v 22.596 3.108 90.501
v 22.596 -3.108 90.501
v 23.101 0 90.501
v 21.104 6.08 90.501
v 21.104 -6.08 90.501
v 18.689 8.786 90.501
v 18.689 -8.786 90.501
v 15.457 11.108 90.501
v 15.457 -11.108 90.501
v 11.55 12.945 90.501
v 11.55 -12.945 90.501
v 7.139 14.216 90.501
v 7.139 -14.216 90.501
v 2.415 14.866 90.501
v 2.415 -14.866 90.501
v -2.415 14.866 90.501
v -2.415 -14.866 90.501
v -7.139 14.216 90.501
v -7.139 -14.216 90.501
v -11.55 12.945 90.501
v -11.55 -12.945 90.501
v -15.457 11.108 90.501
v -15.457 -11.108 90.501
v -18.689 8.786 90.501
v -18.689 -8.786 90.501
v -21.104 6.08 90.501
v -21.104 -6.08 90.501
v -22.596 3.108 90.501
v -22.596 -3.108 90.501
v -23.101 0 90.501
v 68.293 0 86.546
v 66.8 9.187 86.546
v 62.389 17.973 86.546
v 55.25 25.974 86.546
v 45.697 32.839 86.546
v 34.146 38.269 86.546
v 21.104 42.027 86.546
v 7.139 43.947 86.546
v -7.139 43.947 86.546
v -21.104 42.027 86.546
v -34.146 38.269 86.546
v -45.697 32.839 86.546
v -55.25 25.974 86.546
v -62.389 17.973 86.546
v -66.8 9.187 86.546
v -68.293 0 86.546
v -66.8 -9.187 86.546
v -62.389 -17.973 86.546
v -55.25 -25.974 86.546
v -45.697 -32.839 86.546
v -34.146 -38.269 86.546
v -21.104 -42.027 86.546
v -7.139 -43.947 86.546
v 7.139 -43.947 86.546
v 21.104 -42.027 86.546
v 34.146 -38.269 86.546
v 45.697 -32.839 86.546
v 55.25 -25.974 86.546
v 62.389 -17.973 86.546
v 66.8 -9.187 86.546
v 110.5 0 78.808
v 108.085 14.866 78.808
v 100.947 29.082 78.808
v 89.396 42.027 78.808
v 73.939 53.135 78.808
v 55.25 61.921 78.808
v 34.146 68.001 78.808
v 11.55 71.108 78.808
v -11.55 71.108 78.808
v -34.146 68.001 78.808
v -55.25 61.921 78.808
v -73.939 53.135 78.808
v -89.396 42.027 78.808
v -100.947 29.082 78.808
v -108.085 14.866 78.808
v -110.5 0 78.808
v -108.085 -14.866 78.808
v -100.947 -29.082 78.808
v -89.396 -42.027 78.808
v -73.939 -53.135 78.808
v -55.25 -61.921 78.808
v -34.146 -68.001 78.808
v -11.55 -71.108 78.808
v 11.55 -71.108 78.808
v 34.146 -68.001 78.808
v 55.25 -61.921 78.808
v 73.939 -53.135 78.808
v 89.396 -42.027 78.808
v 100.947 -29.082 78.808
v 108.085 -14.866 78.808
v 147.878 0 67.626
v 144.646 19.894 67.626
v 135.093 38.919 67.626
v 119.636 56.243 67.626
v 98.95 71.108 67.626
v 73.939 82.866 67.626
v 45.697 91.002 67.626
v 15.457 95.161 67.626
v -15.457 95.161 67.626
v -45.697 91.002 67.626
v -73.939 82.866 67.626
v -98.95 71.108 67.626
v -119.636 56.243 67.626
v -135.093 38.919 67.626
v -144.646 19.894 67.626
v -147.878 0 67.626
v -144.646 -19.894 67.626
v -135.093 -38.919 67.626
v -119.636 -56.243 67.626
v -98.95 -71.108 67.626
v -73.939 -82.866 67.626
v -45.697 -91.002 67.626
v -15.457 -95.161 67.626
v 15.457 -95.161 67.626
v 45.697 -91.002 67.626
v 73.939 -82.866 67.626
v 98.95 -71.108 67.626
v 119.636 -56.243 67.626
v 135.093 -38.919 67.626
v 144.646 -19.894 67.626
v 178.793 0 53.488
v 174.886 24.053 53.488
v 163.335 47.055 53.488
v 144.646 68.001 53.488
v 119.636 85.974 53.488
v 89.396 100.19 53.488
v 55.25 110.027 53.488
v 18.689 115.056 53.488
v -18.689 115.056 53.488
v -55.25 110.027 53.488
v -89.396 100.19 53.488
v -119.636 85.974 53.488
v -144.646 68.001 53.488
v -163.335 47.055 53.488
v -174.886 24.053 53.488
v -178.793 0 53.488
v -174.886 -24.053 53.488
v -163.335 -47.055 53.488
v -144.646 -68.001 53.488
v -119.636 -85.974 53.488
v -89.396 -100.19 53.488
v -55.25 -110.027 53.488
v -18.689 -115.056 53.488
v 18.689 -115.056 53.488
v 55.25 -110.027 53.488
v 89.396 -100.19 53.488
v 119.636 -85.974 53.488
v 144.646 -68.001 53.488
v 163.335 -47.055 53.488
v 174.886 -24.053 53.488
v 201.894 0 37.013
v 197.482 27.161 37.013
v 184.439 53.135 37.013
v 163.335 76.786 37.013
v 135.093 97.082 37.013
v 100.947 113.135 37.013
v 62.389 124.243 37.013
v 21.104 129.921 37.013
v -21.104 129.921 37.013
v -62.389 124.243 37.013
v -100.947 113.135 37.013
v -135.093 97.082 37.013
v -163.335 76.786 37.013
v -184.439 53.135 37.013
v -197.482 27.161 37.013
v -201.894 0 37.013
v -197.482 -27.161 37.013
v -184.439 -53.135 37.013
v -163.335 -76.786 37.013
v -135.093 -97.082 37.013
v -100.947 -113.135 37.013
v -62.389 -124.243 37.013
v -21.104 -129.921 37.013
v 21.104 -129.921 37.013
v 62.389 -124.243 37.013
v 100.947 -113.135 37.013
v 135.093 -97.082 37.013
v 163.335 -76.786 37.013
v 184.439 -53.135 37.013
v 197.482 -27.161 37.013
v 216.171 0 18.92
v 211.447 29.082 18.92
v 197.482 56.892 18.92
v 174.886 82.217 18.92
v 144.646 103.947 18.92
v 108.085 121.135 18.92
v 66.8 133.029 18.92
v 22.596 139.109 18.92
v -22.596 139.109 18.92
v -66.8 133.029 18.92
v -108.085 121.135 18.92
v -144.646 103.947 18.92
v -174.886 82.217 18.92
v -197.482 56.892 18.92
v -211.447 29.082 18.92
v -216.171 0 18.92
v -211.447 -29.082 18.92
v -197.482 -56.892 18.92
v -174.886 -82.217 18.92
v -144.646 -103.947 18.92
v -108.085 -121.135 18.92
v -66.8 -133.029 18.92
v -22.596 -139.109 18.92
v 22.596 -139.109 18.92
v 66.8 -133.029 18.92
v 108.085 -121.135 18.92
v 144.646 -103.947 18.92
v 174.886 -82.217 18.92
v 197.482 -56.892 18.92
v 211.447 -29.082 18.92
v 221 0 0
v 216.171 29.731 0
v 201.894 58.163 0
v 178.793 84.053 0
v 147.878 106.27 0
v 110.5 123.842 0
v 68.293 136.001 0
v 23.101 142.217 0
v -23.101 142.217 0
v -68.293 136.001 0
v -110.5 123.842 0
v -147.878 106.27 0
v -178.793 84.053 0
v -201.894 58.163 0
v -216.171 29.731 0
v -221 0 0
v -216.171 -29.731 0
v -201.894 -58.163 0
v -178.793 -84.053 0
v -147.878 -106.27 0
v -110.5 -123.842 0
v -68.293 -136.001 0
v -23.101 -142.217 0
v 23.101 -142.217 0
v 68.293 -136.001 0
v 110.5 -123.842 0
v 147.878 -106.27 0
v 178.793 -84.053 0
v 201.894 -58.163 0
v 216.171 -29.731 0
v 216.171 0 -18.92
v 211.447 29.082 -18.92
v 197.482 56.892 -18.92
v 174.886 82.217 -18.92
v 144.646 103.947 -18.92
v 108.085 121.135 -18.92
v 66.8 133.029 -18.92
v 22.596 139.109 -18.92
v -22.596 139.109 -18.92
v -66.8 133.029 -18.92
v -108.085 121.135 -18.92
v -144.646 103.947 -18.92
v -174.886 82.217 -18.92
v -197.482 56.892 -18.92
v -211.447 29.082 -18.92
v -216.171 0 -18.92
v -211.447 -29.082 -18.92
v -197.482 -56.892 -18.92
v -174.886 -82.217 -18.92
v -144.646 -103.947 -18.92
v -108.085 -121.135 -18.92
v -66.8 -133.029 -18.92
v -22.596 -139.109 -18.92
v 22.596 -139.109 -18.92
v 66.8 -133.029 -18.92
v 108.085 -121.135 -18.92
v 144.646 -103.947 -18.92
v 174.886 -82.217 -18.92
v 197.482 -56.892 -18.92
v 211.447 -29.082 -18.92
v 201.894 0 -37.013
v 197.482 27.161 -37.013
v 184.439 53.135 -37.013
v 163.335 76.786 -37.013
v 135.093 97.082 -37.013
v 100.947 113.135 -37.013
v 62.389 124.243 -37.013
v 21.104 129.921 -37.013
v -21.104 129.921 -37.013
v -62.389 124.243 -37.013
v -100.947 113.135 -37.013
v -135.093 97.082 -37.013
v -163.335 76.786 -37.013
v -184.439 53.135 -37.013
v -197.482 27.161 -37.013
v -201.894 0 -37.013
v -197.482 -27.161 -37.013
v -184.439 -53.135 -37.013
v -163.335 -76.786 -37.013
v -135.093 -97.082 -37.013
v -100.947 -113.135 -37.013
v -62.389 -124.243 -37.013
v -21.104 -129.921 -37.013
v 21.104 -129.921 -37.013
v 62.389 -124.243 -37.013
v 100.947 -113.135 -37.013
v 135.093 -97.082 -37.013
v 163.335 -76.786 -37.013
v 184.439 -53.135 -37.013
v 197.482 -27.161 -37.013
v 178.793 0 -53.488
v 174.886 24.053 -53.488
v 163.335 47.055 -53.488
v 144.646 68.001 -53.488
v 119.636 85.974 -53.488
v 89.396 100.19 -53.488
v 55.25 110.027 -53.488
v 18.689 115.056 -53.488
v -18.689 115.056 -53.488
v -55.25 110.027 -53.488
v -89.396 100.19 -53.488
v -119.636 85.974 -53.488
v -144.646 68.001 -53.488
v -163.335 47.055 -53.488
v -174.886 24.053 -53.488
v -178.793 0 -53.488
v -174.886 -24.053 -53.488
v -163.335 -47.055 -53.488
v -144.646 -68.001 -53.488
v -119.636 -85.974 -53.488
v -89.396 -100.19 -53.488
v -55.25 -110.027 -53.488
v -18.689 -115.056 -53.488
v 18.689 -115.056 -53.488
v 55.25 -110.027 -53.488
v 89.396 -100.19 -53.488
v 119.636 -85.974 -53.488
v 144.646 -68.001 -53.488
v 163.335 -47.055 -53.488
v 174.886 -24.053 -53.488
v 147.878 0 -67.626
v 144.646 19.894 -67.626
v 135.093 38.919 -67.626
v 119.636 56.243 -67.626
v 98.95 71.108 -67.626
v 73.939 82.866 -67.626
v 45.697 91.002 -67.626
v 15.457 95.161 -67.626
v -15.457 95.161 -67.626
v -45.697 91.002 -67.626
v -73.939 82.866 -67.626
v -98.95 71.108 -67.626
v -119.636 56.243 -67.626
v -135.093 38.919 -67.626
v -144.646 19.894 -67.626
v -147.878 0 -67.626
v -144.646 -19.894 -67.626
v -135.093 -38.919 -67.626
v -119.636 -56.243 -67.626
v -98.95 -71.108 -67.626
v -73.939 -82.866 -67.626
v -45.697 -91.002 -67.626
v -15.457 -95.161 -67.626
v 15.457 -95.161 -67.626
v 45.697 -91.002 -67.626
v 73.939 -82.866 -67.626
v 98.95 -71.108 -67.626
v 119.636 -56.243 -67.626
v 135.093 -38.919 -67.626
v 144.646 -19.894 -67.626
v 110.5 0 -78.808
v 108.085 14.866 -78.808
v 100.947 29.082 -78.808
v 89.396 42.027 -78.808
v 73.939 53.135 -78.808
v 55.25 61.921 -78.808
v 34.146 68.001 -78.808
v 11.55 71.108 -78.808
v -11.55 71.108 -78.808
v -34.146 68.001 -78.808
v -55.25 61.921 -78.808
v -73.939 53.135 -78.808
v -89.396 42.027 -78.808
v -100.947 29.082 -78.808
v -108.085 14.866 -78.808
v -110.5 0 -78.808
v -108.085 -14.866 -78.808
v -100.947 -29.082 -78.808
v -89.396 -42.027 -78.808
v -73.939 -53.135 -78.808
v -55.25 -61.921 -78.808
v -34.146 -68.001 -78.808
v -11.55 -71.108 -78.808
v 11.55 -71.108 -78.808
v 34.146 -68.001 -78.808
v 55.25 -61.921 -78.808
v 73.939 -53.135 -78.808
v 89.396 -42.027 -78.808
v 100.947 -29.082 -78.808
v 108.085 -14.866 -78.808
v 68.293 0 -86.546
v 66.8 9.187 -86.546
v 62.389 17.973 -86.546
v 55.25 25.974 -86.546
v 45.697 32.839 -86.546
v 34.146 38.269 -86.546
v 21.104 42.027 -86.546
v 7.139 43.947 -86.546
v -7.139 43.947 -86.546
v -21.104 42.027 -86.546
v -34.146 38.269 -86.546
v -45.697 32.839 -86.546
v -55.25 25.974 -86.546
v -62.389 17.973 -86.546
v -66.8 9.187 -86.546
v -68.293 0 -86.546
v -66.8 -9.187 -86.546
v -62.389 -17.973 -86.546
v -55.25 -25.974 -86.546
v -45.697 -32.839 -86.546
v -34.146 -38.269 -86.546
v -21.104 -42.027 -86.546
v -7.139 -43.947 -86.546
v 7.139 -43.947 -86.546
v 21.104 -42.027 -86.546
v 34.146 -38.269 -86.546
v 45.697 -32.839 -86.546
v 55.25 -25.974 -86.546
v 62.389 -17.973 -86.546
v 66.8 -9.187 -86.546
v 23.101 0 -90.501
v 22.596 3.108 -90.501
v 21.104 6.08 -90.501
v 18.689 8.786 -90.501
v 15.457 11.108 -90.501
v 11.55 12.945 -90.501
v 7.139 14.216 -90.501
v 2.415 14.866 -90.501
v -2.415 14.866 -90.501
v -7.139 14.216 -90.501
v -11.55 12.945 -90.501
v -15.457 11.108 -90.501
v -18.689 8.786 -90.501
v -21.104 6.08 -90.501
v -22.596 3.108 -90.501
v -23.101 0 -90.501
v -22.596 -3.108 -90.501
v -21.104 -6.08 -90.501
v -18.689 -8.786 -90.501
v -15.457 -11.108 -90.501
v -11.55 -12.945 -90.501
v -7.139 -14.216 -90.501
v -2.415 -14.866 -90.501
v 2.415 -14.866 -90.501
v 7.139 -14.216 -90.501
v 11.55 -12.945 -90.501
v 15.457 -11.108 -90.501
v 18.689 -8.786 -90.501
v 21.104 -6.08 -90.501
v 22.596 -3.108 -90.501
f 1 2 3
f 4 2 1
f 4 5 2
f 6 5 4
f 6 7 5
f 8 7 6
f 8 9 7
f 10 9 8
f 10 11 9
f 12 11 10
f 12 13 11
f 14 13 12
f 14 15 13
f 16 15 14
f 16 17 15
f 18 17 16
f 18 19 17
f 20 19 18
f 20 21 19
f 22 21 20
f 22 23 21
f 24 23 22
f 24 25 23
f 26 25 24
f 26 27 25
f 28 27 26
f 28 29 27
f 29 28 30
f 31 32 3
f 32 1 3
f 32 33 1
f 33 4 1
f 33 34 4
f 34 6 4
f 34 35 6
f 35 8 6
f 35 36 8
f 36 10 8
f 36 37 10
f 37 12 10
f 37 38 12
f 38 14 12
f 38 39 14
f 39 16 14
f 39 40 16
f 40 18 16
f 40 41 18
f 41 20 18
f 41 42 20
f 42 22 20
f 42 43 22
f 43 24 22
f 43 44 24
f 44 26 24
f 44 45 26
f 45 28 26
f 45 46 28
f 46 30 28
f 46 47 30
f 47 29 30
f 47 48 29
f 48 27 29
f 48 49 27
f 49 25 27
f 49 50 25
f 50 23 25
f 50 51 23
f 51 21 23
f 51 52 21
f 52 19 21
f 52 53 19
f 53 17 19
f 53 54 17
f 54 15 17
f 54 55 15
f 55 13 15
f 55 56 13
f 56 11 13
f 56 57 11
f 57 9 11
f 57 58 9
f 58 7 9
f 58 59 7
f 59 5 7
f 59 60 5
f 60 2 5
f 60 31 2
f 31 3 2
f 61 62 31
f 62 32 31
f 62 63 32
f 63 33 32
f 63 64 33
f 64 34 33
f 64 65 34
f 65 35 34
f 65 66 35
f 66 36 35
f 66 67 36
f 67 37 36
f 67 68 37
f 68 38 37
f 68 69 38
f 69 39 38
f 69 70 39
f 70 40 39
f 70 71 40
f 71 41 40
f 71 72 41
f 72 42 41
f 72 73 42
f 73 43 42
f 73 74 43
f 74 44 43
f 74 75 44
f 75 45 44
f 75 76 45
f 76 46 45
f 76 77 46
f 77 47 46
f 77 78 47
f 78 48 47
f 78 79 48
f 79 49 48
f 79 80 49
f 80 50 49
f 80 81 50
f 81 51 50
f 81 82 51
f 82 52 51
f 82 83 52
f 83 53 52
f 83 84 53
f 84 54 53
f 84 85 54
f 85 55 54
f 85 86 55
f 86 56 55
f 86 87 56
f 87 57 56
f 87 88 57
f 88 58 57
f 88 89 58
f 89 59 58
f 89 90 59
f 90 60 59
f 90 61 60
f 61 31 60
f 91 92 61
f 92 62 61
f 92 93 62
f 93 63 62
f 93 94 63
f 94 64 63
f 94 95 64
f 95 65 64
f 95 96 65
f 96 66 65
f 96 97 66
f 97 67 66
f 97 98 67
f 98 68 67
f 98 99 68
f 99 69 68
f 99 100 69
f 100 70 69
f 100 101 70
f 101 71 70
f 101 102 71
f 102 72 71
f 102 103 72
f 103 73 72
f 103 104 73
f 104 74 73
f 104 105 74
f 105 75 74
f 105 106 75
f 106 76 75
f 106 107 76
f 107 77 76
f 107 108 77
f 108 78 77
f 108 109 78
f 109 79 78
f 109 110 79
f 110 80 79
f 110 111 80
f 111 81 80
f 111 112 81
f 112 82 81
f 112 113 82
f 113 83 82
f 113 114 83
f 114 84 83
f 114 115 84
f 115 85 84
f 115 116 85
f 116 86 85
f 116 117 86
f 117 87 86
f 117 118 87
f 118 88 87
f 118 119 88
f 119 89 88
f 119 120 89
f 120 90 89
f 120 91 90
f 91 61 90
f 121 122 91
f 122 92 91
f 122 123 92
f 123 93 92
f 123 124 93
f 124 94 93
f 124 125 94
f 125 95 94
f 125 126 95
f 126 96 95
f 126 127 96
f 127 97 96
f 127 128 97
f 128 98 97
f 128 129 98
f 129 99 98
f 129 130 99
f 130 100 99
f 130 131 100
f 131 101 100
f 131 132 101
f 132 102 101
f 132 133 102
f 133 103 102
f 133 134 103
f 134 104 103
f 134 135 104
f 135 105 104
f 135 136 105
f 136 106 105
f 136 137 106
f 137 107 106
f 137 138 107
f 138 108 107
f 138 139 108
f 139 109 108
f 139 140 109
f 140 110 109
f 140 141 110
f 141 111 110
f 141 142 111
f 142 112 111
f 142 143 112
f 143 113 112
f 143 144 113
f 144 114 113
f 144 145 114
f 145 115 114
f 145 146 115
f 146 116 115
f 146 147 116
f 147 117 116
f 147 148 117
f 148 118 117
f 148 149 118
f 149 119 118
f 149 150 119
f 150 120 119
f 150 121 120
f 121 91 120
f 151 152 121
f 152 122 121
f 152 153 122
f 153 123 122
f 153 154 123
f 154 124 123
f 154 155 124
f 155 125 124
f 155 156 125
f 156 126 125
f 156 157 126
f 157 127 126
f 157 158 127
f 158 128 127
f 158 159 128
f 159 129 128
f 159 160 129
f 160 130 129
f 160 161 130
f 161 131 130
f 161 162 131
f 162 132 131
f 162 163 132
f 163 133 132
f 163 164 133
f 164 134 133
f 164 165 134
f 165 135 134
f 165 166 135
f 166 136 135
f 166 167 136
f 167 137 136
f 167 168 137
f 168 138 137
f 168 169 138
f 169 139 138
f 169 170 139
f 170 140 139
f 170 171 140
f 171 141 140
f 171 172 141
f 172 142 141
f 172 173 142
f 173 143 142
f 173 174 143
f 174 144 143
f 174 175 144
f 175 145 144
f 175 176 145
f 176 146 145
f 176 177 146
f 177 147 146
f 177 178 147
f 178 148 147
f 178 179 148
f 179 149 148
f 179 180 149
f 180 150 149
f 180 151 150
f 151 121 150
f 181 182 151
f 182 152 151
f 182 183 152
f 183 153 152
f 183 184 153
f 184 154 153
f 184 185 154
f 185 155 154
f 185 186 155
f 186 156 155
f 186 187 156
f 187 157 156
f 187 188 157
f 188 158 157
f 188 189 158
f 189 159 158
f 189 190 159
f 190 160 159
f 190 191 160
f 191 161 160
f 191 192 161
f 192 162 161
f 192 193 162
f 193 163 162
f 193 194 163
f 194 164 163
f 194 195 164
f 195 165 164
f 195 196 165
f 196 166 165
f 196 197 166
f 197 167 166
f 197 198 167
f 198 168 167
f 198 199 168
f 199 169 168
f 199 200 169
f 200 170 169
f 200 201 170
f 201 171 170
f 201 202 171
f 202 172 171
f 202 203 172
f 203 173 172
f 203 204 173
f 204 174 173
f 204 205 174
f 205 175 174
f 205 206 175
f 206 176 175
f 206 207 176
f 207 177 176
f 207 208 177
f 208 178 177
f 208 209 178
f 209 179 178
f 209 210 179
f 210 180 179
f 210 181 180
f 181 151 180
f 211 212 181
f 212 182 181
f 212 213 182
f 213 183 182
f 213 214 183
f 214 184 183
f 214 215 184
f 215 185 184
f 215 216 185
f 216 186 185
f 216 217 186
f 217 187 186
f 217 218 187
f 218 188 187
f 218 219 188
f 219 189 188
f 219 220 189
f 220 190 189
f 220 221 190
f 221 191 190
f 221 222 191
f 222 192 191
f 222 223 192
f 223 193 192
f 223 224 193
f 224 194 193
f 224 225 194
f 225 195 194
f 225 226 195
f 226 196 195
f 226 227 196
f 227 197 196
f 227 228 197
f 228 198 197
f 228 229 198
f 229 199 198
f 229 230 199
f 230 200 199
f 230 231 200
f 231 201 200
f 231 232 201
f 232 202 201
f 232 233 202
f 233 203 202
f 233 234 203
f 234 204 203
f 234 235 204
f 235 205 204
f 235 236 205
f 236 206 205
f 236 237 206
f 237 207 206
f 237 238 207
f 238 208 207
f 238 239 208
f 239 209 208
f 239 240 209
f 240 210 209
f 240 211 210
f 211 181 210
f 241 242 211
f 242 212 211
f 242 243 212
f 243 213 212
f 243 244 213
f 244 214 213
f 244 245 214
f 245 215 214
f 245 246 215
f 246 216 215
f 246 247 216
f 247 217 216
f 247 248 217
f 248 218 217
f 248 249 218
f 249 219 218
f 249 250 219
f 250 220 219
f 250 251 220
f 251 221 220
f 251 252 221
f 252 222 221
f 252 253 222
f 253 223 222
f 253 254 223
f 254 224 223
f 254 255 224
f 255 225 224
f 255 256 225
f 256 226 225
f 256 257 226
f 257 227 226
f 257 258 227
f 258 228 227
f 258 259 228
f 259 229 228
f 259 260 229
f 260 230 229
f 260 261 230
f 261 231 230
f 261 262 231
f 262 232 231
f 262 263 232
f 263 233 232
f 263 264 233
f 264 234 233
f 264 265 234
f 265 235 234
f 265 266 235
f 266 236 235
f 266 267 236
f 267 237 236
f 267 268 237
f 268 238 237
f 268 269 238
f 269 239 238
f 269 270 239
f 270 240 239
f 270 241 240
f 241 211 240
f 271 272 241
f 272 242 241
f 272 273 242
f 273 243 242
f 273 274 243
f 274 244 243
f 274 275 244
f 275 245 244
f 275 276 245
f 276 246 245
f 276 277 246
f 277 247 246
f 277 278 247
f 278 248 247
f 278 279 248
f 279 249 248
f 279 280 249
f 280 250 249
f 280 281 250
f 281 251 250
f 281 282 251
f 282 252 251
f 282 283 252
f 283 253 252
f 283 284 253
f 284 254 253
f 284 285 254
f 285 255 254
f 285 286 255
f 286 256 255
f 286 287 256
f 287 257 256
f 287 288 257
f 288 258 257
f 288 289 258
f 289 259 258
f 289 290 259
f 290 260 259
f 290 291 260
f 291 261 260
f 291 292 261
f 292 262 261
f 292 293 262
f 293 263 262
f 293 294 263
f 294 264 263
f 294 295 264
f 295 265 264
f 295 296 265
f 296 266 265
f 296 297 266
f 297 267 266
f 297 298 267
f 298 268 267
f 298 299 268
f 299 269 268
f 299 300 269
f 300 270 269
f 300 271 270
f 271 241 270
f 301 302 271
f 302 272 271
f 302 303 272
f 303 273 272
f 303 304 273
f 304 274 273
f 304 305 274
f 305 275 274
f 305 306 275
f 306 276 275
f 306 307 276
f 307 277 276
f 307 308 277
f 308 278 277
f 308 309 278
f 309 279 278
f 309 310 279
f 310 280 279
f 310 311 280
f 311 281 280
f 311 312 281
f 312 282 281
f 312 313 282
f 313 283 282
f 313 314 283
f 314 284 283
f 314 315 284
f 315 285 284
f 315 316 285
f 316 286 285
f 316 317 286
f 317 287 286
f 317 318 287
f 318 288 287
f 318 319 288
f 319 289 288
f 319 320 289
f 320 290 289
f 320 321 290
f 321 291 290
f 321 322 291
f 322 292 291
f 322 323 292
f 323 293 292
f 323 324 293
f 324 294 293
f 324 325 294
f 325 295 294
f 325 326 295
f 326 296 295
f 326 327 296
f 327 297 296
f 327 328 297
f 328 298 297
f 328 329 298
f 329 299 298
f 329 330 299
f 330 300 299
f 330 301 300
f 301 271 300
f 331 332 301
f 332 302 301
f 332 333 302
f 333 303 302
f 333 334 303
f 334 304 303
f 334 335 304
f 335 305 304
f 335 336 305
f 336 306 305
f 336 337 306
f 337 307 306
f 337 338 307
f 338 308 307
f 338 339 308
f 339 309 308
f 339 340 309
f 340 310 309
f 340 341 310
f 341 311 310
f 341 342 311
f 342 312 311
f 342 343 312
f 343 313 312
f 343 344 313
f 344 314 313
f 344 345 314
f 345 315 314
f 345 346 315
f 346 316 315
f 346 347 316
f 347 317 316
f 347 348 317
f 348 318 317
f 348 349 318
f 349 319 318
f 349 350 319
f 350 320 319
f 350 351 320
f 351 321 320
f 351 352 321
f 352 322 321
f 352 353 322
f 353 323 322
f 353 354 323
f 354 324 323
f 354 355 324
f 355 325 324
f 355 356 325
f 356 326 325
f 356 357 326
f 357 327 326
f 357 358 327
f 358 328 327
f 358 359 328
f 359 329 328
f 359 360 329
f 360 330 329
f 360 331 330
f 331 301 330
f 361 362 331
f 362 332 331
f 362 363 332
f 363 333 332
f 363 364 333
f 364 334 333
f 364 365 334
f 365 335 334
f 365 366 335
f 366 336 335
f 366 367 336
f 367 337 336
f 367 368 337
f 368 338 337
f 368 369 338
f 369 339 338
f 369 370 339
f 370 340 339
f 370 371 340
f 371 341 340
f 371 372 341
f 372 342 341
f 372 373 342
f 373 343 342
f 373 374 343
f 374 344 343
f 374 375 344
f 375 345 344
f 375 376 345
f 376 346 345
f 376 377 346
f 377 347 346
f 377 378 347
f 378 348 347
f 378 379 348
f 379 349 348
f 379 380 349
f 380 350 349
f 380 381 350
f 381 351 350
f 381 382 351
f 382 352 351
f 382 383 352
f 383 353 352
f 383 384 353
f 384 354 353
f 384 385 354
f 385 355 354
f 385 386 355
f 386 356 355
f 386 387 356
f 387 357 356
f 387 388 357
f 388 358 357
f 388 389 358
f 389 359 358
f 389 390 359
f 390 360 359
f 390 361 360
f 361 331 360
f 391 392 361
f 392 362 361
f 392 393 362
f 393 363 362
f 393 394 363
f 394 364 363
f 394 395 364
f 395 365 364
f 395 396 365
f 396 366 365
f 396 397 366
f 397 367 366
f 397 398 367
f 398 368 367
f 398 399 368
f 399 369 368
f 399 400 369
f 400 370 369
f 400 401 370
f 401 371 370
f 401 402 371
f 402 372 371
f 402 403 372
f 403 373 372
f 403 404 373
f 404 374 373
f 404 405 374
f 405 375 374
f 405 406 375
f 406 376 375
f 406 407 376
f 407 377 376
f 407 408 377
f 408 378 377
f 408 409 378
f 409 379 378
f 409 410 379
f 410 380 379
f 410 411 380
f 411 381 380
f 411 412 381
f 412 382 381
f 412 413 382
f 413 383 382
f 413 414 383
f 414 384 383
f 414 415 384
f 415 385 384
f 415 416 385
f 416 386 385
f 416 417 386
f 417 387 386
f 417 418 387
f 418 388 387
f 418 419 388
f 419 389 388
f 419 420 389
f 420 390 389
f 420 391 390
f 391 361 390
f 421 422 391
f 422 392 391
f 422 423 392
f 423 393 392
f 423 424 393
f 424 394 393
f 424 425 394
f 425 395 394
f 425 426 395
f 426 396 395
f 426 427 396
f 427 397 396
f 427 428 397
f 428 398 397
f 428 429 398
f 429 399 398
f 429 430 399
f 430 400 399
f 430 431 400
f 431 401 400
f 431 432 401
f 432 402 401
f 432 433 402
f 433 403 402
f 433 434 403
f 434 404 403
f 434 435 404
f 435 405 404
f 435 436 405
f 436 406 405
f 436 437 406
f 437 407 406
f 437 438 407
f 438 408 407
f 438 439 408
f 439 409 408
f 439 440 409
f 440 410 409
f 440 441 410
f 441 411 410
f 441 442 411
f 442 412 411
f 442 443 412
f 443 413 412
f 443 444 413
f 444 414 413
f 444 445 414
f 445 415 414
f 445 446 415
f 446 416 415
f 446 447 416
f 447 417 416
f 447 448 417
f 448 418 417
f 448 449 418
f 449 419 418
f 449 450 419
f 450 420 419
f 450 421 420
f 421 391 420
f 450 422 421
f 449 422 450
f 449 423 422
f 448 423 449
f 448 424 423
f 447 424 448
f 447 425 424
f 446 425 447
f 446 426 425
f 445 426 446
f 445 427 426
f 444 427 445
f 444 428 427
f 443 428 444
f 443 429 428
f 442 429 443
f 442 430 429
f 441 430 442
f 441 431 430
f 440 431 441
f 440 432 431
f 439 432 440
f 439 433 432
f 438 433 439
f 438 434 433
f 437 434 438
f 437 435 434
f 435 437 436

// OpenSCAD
// Generated by SolidPython 1.0.1 on 2020-07-29 00:46:53


scale(v = [17, 11, 7]) {
	sphere(r = 13);
}
/***********************************************
*********      SolidPython code:      **********
************************************************
 
# import packages: SolidPython
from solid import *
from solid.utils import *
from itertools import chain, combinations, permutations


class Resize:

    def __init__(self, scad_file):
        self.scad_file = scad_file
        #self.scad_file = import_scad(scad_file)
        # cone/cylinder param:
        self.r1 = 0
        self.r2 = 0
        self.h = 0
        # rectangular prism param:
        self.w = 0
        self.l = 0
        # ellipse param:
        self.r = 0

    # import OpenScad code (file name corresponds to shape)


    # classify shape + parameters
    def assign(self, param1, param2, param3):
        if self.scad_file == 'cone.scad':
            self.r1 = param1
            self.r2 = param2
            self.h = param3
        elif self.scad_file == 'cylinder.scad':
            self.r1 = param1
            self.r2 = param2
            self.h = param3
        elif self.scad_file == 'rectangularPrism.scad':
            self.h = param1
            self.l = param2
            self.w = param3
        else:
            self.r = param1
            self.h = param2

    # resize parameters
    def iterate(self):
        x = range(3, 20, 2)
        i = 1
        if self.scad_file == 'cone.scad':
            tempList = list(permutations(x, 2))
            for temp in tempList:
                param1 = temp[0]
                param2 = temp[1]
                filepath = 'produced_scad_files/' + 'cone' + str(param1) + '_' + str(param2) + '_' + '.scad'
                scad_render_to_file(cylinder(h=param1, r1=param2, r2=0), filepath)

        elif self.scad_file == 'cylinder.scad':
            tempList = list(permutations(x, 3))
            for temp in tempList:
                param1 = temp[0]
                param2 = temp[1]
                filepath = 'produced_scad_files/' + 'cylinder' + str(param1) + '_' + str(param2) + '_' + '.scad'
                scad_render_to_file(cylinder(h=param1, r1=param2, r2=param2), filepath)

        elif self.scad_file == 'rectangularPrism.scad':
            tempList = list(permutations(x, 3))
            for temp in tempList:
                param1 = temp[0]
                param2 = temp[1]
                param3 = temp[2]
                filepath = 'produced_scad_files/' + 'rectangularPrism' + str(param1) + '_' + str(param2) + '_' + str(
                    param3) + '.scad'
                scad_render_to_file(cube(size=(param1, param2, param3)), filepath)

        elif self.scad_file == 'ellipse.scad':
            tempList = list(permutations(x, 4))
            for temp in tempList:
                param1 = temp[0]
                param2 = temp[1]
                param3 = temp[2]
                param4 = temp[3]
                filepath = 'produced_scad_files/' + 'ellipse' + str(param1) + '_' + str(param2) + '_' + str(param3) + '_' + str(param4) + '.scad'
                scad_render_to_file(scale([param1, param2, param3])(sphere(r=param4)), filepath)

    def render_to_scadfile(self):
        scad_render_to_file(scad, 'example.scad') 
 
************************************************/
